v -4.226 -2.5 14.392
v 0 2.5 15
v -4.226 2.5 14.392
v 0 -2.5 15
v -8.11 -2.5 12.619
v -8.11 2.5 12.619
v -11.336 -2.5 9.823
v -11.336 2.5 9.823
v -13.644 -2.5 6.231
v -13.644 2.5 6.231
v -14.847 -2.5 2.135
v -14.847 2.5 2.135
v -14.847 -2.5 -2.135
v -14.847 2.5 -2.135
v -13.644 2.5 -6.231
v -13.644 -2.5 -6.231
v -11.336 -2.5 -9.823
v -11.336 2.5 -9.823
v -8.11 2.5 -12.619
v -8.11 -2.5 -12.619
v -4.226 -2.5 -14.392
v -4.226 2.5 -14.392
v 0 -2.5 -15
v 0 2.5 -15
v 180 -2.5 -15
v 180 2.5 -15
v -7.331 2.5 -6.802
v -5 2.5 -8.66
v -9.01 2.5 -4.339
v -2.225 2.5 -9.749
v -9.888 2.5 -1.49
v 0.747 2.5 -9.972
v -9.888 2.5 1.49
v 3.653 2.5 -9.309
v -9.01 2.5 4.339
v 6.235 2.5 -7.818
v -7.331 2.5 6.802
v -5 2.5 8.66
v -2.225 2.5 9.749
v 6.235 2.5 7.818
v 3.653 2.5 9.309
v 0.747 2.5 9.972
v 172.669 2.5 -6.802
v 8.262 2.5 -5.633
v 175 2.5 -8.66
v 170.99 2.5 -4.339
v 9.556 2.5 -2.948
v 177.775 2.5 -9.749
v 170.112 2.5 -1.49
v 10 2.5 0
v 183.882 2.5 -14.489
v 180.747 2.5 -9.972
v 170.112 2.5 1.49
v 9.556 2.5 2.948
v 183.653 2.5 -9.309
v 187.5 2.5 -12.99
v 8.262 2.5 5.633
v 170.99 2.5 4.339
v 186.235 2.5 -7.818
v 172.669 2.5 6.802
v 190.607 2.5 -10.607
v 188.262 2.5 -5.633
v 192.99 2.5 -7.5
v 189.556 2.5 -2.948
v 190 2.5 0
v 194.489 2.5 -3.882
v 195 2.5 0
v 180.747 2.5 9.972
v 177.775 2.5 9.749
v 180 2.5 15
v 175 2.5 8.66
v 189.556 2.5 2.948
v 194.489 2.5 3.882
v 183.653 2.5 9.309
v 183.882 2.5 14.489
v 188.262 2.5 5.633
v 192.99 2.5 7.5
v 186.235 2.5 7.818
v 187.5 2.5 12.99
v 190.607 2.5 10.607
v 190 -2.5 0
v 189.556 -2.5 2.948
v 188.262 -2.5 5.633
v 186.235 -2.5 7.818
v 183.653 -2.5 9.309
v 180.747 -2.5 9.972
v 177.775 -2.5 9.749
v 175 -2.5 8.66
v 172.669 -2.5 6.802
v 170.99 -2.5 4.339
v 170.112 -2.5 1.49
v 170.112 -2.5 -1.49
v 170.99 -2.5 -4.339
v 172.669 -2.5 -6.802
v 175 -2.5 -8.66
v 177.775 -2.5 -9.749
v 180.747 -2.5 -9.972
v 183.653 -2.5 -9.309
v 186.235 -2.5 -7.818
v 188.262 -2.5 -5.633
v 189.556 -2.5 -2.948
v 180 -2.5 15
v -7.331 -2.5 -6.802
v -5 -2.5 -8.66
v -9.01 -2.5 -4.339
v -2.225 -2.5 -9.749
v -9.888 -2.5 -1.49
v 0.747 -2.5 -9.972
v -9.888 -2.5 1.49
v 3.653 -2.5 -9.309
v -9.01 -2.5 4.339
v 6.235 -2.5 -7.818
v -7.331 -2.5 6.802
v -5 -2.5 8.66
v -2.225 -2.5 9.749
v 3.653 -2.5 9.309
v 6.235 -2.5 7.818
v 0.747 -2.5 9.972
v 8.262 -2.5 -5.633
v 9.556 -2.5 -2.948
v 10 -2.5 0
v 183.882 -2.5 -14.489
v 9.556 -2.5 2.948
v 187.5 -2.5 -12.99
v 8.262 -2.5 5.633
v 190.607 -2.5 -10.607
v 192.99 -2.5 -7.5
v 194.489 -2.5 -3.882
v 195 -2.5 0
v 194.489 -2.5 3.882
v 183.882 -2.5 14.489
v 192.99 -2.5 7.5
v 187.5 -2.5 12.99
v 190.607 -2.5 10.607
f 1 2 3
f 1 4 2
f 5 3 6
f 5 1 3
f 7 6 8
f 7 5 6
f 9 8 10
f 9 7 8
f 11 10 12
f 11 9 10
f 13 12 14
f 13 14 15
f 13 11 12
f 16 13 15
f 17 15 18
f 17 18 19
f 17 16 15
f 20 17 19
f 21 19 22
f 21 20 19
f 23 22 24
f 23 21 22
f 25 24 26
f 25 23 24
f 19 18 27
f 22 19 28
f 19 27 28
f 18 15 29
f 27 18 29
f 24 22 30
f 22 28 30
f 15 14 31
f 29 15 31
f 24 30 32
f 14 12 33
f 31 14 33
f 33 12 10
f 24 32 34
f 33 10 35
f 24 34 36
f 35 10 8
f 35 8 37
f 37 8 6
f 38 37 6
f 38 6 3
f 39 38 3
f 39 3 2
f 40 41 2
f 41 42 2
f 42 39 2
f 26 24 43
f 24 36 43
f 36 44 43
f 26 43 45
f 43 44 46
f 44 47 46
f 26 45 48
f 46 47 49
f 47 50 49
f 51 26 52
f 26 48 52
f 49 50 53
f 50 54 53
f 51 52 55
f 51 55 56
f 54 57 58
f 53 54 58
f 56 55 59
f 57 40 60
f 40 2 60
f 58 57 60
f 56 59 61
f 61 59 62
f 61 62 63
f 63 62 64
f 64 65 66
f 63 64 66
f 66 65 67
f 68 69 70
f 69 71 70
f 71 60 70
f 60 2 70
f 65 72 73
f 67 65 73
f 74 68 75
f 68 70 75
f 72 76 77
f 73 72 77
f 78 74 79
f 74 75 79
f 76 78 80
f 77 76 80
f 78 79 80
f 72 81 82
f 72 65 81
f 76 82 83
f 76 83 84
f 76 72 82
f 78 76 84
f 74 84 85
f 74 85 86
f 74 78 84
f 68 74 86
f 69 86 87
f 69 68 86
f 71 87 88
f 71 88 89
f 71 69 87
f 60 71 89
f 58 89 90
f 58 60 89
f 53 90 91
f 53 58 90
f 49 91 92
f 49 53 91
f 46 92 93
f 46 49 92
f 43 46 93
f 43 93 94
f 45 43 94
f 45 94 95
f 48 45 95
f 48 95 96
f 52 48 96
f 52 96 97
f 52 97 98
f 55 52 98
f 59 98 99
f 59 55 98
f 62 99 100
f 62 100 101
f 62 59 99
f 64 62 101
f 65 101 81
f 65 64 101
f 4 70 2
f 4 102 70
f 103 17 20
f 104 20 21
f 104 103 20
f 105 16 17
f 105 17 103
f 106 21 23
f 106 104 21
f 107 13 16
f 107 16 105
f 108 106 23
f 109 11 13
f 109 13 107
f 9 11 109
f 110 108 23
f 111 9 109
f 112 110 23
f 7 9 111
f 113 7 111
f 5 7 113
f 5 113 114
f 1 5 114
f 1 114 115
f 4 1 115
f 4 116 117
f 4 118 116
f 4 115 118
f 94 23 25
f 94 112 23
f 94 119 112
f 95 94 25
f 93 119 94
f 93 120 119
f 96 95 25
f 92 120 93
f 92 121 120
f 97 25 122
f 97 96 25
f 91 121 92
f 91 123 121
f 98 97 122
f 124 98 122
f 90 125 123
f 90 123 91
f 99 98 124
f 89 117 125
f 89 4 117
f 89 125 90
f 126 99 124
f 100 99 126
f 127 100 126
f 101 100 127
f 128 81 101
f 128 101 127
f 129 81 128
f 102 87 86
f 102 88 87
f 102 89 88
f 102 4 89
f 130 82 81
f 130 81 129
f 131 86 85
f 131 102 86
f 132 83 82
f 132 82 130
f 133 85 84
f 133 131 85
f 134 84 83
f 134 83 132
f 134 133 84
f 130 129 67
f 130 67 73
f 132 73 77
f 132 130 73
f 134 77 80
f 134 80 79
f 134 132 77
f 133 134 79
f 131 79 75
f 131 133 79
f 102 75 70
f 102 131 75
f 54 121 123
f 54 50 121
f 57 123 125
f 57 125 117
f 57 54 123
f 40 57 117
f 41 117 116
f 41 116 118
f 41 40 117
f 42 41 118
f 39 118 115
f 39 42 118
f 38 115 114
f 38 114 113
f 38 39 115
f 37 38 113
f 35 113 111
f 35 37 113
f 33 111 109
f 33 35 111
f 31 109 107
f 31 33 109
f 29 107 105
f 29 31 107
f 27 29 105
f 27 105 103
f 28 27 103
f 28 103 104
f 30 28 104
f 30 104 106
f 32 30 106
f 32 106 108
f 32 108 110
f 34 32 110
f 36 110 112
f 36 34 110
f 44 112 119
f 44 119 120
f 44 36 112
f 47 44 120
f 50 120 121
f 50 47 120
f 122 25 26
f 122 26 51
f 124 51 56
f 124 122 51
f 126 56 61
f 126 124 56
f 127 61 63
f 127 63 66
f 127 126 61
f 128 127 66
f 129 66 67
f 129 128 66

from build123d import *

# Parameters (mm, degrees)
F0_R     = 10
F1_DEPTH = 2.5


with BuildPart() as f1:
    # F0 (on Front) → F1 (new body, symmetric)
    with BuildSketch(Plane.XZ):
        with BuildLine():
            ThreePointArc((0, 15), (10.606602, 10.606602), (15, 0))
            ThreePointArc((15, 0), (10.606602, -10.606602), (0, -15))
            Line((0, -15), (180, -15))
            ThreePointArc((180, -15), (165, 0), (180, 15))
            Line((180, 15), (0, 15))
        make_face()
        with BuildLine():
            ThreePointArc((0, -15), (10.606602, -10.606602), (15, 0))
            ThreePointArc((15, 0), (10.606602, 10.606602), (0, 15))
            ThreePointArc((0, 15), (-15, 0), (0, -15))
        make_face()
        Circle(F0_R, mode=Mode.SUBTRACT)
        with BuildLine():
            ThreePointArc((195, 0), (190.606602, 10.606602), (180, 15))
            ThreePointArc((180, 15), (165, 0), (180, -15))
            ThreePointArc((180, -15), (190.606602, -10.606602), (195, 0))
        make_face()
        with Locations((180, 0)):
            Circle(F0_R, mode=Mode.SUBTRACT)
    extrude(amount=F1_DEPTH, both=True)


solid = f1.part
